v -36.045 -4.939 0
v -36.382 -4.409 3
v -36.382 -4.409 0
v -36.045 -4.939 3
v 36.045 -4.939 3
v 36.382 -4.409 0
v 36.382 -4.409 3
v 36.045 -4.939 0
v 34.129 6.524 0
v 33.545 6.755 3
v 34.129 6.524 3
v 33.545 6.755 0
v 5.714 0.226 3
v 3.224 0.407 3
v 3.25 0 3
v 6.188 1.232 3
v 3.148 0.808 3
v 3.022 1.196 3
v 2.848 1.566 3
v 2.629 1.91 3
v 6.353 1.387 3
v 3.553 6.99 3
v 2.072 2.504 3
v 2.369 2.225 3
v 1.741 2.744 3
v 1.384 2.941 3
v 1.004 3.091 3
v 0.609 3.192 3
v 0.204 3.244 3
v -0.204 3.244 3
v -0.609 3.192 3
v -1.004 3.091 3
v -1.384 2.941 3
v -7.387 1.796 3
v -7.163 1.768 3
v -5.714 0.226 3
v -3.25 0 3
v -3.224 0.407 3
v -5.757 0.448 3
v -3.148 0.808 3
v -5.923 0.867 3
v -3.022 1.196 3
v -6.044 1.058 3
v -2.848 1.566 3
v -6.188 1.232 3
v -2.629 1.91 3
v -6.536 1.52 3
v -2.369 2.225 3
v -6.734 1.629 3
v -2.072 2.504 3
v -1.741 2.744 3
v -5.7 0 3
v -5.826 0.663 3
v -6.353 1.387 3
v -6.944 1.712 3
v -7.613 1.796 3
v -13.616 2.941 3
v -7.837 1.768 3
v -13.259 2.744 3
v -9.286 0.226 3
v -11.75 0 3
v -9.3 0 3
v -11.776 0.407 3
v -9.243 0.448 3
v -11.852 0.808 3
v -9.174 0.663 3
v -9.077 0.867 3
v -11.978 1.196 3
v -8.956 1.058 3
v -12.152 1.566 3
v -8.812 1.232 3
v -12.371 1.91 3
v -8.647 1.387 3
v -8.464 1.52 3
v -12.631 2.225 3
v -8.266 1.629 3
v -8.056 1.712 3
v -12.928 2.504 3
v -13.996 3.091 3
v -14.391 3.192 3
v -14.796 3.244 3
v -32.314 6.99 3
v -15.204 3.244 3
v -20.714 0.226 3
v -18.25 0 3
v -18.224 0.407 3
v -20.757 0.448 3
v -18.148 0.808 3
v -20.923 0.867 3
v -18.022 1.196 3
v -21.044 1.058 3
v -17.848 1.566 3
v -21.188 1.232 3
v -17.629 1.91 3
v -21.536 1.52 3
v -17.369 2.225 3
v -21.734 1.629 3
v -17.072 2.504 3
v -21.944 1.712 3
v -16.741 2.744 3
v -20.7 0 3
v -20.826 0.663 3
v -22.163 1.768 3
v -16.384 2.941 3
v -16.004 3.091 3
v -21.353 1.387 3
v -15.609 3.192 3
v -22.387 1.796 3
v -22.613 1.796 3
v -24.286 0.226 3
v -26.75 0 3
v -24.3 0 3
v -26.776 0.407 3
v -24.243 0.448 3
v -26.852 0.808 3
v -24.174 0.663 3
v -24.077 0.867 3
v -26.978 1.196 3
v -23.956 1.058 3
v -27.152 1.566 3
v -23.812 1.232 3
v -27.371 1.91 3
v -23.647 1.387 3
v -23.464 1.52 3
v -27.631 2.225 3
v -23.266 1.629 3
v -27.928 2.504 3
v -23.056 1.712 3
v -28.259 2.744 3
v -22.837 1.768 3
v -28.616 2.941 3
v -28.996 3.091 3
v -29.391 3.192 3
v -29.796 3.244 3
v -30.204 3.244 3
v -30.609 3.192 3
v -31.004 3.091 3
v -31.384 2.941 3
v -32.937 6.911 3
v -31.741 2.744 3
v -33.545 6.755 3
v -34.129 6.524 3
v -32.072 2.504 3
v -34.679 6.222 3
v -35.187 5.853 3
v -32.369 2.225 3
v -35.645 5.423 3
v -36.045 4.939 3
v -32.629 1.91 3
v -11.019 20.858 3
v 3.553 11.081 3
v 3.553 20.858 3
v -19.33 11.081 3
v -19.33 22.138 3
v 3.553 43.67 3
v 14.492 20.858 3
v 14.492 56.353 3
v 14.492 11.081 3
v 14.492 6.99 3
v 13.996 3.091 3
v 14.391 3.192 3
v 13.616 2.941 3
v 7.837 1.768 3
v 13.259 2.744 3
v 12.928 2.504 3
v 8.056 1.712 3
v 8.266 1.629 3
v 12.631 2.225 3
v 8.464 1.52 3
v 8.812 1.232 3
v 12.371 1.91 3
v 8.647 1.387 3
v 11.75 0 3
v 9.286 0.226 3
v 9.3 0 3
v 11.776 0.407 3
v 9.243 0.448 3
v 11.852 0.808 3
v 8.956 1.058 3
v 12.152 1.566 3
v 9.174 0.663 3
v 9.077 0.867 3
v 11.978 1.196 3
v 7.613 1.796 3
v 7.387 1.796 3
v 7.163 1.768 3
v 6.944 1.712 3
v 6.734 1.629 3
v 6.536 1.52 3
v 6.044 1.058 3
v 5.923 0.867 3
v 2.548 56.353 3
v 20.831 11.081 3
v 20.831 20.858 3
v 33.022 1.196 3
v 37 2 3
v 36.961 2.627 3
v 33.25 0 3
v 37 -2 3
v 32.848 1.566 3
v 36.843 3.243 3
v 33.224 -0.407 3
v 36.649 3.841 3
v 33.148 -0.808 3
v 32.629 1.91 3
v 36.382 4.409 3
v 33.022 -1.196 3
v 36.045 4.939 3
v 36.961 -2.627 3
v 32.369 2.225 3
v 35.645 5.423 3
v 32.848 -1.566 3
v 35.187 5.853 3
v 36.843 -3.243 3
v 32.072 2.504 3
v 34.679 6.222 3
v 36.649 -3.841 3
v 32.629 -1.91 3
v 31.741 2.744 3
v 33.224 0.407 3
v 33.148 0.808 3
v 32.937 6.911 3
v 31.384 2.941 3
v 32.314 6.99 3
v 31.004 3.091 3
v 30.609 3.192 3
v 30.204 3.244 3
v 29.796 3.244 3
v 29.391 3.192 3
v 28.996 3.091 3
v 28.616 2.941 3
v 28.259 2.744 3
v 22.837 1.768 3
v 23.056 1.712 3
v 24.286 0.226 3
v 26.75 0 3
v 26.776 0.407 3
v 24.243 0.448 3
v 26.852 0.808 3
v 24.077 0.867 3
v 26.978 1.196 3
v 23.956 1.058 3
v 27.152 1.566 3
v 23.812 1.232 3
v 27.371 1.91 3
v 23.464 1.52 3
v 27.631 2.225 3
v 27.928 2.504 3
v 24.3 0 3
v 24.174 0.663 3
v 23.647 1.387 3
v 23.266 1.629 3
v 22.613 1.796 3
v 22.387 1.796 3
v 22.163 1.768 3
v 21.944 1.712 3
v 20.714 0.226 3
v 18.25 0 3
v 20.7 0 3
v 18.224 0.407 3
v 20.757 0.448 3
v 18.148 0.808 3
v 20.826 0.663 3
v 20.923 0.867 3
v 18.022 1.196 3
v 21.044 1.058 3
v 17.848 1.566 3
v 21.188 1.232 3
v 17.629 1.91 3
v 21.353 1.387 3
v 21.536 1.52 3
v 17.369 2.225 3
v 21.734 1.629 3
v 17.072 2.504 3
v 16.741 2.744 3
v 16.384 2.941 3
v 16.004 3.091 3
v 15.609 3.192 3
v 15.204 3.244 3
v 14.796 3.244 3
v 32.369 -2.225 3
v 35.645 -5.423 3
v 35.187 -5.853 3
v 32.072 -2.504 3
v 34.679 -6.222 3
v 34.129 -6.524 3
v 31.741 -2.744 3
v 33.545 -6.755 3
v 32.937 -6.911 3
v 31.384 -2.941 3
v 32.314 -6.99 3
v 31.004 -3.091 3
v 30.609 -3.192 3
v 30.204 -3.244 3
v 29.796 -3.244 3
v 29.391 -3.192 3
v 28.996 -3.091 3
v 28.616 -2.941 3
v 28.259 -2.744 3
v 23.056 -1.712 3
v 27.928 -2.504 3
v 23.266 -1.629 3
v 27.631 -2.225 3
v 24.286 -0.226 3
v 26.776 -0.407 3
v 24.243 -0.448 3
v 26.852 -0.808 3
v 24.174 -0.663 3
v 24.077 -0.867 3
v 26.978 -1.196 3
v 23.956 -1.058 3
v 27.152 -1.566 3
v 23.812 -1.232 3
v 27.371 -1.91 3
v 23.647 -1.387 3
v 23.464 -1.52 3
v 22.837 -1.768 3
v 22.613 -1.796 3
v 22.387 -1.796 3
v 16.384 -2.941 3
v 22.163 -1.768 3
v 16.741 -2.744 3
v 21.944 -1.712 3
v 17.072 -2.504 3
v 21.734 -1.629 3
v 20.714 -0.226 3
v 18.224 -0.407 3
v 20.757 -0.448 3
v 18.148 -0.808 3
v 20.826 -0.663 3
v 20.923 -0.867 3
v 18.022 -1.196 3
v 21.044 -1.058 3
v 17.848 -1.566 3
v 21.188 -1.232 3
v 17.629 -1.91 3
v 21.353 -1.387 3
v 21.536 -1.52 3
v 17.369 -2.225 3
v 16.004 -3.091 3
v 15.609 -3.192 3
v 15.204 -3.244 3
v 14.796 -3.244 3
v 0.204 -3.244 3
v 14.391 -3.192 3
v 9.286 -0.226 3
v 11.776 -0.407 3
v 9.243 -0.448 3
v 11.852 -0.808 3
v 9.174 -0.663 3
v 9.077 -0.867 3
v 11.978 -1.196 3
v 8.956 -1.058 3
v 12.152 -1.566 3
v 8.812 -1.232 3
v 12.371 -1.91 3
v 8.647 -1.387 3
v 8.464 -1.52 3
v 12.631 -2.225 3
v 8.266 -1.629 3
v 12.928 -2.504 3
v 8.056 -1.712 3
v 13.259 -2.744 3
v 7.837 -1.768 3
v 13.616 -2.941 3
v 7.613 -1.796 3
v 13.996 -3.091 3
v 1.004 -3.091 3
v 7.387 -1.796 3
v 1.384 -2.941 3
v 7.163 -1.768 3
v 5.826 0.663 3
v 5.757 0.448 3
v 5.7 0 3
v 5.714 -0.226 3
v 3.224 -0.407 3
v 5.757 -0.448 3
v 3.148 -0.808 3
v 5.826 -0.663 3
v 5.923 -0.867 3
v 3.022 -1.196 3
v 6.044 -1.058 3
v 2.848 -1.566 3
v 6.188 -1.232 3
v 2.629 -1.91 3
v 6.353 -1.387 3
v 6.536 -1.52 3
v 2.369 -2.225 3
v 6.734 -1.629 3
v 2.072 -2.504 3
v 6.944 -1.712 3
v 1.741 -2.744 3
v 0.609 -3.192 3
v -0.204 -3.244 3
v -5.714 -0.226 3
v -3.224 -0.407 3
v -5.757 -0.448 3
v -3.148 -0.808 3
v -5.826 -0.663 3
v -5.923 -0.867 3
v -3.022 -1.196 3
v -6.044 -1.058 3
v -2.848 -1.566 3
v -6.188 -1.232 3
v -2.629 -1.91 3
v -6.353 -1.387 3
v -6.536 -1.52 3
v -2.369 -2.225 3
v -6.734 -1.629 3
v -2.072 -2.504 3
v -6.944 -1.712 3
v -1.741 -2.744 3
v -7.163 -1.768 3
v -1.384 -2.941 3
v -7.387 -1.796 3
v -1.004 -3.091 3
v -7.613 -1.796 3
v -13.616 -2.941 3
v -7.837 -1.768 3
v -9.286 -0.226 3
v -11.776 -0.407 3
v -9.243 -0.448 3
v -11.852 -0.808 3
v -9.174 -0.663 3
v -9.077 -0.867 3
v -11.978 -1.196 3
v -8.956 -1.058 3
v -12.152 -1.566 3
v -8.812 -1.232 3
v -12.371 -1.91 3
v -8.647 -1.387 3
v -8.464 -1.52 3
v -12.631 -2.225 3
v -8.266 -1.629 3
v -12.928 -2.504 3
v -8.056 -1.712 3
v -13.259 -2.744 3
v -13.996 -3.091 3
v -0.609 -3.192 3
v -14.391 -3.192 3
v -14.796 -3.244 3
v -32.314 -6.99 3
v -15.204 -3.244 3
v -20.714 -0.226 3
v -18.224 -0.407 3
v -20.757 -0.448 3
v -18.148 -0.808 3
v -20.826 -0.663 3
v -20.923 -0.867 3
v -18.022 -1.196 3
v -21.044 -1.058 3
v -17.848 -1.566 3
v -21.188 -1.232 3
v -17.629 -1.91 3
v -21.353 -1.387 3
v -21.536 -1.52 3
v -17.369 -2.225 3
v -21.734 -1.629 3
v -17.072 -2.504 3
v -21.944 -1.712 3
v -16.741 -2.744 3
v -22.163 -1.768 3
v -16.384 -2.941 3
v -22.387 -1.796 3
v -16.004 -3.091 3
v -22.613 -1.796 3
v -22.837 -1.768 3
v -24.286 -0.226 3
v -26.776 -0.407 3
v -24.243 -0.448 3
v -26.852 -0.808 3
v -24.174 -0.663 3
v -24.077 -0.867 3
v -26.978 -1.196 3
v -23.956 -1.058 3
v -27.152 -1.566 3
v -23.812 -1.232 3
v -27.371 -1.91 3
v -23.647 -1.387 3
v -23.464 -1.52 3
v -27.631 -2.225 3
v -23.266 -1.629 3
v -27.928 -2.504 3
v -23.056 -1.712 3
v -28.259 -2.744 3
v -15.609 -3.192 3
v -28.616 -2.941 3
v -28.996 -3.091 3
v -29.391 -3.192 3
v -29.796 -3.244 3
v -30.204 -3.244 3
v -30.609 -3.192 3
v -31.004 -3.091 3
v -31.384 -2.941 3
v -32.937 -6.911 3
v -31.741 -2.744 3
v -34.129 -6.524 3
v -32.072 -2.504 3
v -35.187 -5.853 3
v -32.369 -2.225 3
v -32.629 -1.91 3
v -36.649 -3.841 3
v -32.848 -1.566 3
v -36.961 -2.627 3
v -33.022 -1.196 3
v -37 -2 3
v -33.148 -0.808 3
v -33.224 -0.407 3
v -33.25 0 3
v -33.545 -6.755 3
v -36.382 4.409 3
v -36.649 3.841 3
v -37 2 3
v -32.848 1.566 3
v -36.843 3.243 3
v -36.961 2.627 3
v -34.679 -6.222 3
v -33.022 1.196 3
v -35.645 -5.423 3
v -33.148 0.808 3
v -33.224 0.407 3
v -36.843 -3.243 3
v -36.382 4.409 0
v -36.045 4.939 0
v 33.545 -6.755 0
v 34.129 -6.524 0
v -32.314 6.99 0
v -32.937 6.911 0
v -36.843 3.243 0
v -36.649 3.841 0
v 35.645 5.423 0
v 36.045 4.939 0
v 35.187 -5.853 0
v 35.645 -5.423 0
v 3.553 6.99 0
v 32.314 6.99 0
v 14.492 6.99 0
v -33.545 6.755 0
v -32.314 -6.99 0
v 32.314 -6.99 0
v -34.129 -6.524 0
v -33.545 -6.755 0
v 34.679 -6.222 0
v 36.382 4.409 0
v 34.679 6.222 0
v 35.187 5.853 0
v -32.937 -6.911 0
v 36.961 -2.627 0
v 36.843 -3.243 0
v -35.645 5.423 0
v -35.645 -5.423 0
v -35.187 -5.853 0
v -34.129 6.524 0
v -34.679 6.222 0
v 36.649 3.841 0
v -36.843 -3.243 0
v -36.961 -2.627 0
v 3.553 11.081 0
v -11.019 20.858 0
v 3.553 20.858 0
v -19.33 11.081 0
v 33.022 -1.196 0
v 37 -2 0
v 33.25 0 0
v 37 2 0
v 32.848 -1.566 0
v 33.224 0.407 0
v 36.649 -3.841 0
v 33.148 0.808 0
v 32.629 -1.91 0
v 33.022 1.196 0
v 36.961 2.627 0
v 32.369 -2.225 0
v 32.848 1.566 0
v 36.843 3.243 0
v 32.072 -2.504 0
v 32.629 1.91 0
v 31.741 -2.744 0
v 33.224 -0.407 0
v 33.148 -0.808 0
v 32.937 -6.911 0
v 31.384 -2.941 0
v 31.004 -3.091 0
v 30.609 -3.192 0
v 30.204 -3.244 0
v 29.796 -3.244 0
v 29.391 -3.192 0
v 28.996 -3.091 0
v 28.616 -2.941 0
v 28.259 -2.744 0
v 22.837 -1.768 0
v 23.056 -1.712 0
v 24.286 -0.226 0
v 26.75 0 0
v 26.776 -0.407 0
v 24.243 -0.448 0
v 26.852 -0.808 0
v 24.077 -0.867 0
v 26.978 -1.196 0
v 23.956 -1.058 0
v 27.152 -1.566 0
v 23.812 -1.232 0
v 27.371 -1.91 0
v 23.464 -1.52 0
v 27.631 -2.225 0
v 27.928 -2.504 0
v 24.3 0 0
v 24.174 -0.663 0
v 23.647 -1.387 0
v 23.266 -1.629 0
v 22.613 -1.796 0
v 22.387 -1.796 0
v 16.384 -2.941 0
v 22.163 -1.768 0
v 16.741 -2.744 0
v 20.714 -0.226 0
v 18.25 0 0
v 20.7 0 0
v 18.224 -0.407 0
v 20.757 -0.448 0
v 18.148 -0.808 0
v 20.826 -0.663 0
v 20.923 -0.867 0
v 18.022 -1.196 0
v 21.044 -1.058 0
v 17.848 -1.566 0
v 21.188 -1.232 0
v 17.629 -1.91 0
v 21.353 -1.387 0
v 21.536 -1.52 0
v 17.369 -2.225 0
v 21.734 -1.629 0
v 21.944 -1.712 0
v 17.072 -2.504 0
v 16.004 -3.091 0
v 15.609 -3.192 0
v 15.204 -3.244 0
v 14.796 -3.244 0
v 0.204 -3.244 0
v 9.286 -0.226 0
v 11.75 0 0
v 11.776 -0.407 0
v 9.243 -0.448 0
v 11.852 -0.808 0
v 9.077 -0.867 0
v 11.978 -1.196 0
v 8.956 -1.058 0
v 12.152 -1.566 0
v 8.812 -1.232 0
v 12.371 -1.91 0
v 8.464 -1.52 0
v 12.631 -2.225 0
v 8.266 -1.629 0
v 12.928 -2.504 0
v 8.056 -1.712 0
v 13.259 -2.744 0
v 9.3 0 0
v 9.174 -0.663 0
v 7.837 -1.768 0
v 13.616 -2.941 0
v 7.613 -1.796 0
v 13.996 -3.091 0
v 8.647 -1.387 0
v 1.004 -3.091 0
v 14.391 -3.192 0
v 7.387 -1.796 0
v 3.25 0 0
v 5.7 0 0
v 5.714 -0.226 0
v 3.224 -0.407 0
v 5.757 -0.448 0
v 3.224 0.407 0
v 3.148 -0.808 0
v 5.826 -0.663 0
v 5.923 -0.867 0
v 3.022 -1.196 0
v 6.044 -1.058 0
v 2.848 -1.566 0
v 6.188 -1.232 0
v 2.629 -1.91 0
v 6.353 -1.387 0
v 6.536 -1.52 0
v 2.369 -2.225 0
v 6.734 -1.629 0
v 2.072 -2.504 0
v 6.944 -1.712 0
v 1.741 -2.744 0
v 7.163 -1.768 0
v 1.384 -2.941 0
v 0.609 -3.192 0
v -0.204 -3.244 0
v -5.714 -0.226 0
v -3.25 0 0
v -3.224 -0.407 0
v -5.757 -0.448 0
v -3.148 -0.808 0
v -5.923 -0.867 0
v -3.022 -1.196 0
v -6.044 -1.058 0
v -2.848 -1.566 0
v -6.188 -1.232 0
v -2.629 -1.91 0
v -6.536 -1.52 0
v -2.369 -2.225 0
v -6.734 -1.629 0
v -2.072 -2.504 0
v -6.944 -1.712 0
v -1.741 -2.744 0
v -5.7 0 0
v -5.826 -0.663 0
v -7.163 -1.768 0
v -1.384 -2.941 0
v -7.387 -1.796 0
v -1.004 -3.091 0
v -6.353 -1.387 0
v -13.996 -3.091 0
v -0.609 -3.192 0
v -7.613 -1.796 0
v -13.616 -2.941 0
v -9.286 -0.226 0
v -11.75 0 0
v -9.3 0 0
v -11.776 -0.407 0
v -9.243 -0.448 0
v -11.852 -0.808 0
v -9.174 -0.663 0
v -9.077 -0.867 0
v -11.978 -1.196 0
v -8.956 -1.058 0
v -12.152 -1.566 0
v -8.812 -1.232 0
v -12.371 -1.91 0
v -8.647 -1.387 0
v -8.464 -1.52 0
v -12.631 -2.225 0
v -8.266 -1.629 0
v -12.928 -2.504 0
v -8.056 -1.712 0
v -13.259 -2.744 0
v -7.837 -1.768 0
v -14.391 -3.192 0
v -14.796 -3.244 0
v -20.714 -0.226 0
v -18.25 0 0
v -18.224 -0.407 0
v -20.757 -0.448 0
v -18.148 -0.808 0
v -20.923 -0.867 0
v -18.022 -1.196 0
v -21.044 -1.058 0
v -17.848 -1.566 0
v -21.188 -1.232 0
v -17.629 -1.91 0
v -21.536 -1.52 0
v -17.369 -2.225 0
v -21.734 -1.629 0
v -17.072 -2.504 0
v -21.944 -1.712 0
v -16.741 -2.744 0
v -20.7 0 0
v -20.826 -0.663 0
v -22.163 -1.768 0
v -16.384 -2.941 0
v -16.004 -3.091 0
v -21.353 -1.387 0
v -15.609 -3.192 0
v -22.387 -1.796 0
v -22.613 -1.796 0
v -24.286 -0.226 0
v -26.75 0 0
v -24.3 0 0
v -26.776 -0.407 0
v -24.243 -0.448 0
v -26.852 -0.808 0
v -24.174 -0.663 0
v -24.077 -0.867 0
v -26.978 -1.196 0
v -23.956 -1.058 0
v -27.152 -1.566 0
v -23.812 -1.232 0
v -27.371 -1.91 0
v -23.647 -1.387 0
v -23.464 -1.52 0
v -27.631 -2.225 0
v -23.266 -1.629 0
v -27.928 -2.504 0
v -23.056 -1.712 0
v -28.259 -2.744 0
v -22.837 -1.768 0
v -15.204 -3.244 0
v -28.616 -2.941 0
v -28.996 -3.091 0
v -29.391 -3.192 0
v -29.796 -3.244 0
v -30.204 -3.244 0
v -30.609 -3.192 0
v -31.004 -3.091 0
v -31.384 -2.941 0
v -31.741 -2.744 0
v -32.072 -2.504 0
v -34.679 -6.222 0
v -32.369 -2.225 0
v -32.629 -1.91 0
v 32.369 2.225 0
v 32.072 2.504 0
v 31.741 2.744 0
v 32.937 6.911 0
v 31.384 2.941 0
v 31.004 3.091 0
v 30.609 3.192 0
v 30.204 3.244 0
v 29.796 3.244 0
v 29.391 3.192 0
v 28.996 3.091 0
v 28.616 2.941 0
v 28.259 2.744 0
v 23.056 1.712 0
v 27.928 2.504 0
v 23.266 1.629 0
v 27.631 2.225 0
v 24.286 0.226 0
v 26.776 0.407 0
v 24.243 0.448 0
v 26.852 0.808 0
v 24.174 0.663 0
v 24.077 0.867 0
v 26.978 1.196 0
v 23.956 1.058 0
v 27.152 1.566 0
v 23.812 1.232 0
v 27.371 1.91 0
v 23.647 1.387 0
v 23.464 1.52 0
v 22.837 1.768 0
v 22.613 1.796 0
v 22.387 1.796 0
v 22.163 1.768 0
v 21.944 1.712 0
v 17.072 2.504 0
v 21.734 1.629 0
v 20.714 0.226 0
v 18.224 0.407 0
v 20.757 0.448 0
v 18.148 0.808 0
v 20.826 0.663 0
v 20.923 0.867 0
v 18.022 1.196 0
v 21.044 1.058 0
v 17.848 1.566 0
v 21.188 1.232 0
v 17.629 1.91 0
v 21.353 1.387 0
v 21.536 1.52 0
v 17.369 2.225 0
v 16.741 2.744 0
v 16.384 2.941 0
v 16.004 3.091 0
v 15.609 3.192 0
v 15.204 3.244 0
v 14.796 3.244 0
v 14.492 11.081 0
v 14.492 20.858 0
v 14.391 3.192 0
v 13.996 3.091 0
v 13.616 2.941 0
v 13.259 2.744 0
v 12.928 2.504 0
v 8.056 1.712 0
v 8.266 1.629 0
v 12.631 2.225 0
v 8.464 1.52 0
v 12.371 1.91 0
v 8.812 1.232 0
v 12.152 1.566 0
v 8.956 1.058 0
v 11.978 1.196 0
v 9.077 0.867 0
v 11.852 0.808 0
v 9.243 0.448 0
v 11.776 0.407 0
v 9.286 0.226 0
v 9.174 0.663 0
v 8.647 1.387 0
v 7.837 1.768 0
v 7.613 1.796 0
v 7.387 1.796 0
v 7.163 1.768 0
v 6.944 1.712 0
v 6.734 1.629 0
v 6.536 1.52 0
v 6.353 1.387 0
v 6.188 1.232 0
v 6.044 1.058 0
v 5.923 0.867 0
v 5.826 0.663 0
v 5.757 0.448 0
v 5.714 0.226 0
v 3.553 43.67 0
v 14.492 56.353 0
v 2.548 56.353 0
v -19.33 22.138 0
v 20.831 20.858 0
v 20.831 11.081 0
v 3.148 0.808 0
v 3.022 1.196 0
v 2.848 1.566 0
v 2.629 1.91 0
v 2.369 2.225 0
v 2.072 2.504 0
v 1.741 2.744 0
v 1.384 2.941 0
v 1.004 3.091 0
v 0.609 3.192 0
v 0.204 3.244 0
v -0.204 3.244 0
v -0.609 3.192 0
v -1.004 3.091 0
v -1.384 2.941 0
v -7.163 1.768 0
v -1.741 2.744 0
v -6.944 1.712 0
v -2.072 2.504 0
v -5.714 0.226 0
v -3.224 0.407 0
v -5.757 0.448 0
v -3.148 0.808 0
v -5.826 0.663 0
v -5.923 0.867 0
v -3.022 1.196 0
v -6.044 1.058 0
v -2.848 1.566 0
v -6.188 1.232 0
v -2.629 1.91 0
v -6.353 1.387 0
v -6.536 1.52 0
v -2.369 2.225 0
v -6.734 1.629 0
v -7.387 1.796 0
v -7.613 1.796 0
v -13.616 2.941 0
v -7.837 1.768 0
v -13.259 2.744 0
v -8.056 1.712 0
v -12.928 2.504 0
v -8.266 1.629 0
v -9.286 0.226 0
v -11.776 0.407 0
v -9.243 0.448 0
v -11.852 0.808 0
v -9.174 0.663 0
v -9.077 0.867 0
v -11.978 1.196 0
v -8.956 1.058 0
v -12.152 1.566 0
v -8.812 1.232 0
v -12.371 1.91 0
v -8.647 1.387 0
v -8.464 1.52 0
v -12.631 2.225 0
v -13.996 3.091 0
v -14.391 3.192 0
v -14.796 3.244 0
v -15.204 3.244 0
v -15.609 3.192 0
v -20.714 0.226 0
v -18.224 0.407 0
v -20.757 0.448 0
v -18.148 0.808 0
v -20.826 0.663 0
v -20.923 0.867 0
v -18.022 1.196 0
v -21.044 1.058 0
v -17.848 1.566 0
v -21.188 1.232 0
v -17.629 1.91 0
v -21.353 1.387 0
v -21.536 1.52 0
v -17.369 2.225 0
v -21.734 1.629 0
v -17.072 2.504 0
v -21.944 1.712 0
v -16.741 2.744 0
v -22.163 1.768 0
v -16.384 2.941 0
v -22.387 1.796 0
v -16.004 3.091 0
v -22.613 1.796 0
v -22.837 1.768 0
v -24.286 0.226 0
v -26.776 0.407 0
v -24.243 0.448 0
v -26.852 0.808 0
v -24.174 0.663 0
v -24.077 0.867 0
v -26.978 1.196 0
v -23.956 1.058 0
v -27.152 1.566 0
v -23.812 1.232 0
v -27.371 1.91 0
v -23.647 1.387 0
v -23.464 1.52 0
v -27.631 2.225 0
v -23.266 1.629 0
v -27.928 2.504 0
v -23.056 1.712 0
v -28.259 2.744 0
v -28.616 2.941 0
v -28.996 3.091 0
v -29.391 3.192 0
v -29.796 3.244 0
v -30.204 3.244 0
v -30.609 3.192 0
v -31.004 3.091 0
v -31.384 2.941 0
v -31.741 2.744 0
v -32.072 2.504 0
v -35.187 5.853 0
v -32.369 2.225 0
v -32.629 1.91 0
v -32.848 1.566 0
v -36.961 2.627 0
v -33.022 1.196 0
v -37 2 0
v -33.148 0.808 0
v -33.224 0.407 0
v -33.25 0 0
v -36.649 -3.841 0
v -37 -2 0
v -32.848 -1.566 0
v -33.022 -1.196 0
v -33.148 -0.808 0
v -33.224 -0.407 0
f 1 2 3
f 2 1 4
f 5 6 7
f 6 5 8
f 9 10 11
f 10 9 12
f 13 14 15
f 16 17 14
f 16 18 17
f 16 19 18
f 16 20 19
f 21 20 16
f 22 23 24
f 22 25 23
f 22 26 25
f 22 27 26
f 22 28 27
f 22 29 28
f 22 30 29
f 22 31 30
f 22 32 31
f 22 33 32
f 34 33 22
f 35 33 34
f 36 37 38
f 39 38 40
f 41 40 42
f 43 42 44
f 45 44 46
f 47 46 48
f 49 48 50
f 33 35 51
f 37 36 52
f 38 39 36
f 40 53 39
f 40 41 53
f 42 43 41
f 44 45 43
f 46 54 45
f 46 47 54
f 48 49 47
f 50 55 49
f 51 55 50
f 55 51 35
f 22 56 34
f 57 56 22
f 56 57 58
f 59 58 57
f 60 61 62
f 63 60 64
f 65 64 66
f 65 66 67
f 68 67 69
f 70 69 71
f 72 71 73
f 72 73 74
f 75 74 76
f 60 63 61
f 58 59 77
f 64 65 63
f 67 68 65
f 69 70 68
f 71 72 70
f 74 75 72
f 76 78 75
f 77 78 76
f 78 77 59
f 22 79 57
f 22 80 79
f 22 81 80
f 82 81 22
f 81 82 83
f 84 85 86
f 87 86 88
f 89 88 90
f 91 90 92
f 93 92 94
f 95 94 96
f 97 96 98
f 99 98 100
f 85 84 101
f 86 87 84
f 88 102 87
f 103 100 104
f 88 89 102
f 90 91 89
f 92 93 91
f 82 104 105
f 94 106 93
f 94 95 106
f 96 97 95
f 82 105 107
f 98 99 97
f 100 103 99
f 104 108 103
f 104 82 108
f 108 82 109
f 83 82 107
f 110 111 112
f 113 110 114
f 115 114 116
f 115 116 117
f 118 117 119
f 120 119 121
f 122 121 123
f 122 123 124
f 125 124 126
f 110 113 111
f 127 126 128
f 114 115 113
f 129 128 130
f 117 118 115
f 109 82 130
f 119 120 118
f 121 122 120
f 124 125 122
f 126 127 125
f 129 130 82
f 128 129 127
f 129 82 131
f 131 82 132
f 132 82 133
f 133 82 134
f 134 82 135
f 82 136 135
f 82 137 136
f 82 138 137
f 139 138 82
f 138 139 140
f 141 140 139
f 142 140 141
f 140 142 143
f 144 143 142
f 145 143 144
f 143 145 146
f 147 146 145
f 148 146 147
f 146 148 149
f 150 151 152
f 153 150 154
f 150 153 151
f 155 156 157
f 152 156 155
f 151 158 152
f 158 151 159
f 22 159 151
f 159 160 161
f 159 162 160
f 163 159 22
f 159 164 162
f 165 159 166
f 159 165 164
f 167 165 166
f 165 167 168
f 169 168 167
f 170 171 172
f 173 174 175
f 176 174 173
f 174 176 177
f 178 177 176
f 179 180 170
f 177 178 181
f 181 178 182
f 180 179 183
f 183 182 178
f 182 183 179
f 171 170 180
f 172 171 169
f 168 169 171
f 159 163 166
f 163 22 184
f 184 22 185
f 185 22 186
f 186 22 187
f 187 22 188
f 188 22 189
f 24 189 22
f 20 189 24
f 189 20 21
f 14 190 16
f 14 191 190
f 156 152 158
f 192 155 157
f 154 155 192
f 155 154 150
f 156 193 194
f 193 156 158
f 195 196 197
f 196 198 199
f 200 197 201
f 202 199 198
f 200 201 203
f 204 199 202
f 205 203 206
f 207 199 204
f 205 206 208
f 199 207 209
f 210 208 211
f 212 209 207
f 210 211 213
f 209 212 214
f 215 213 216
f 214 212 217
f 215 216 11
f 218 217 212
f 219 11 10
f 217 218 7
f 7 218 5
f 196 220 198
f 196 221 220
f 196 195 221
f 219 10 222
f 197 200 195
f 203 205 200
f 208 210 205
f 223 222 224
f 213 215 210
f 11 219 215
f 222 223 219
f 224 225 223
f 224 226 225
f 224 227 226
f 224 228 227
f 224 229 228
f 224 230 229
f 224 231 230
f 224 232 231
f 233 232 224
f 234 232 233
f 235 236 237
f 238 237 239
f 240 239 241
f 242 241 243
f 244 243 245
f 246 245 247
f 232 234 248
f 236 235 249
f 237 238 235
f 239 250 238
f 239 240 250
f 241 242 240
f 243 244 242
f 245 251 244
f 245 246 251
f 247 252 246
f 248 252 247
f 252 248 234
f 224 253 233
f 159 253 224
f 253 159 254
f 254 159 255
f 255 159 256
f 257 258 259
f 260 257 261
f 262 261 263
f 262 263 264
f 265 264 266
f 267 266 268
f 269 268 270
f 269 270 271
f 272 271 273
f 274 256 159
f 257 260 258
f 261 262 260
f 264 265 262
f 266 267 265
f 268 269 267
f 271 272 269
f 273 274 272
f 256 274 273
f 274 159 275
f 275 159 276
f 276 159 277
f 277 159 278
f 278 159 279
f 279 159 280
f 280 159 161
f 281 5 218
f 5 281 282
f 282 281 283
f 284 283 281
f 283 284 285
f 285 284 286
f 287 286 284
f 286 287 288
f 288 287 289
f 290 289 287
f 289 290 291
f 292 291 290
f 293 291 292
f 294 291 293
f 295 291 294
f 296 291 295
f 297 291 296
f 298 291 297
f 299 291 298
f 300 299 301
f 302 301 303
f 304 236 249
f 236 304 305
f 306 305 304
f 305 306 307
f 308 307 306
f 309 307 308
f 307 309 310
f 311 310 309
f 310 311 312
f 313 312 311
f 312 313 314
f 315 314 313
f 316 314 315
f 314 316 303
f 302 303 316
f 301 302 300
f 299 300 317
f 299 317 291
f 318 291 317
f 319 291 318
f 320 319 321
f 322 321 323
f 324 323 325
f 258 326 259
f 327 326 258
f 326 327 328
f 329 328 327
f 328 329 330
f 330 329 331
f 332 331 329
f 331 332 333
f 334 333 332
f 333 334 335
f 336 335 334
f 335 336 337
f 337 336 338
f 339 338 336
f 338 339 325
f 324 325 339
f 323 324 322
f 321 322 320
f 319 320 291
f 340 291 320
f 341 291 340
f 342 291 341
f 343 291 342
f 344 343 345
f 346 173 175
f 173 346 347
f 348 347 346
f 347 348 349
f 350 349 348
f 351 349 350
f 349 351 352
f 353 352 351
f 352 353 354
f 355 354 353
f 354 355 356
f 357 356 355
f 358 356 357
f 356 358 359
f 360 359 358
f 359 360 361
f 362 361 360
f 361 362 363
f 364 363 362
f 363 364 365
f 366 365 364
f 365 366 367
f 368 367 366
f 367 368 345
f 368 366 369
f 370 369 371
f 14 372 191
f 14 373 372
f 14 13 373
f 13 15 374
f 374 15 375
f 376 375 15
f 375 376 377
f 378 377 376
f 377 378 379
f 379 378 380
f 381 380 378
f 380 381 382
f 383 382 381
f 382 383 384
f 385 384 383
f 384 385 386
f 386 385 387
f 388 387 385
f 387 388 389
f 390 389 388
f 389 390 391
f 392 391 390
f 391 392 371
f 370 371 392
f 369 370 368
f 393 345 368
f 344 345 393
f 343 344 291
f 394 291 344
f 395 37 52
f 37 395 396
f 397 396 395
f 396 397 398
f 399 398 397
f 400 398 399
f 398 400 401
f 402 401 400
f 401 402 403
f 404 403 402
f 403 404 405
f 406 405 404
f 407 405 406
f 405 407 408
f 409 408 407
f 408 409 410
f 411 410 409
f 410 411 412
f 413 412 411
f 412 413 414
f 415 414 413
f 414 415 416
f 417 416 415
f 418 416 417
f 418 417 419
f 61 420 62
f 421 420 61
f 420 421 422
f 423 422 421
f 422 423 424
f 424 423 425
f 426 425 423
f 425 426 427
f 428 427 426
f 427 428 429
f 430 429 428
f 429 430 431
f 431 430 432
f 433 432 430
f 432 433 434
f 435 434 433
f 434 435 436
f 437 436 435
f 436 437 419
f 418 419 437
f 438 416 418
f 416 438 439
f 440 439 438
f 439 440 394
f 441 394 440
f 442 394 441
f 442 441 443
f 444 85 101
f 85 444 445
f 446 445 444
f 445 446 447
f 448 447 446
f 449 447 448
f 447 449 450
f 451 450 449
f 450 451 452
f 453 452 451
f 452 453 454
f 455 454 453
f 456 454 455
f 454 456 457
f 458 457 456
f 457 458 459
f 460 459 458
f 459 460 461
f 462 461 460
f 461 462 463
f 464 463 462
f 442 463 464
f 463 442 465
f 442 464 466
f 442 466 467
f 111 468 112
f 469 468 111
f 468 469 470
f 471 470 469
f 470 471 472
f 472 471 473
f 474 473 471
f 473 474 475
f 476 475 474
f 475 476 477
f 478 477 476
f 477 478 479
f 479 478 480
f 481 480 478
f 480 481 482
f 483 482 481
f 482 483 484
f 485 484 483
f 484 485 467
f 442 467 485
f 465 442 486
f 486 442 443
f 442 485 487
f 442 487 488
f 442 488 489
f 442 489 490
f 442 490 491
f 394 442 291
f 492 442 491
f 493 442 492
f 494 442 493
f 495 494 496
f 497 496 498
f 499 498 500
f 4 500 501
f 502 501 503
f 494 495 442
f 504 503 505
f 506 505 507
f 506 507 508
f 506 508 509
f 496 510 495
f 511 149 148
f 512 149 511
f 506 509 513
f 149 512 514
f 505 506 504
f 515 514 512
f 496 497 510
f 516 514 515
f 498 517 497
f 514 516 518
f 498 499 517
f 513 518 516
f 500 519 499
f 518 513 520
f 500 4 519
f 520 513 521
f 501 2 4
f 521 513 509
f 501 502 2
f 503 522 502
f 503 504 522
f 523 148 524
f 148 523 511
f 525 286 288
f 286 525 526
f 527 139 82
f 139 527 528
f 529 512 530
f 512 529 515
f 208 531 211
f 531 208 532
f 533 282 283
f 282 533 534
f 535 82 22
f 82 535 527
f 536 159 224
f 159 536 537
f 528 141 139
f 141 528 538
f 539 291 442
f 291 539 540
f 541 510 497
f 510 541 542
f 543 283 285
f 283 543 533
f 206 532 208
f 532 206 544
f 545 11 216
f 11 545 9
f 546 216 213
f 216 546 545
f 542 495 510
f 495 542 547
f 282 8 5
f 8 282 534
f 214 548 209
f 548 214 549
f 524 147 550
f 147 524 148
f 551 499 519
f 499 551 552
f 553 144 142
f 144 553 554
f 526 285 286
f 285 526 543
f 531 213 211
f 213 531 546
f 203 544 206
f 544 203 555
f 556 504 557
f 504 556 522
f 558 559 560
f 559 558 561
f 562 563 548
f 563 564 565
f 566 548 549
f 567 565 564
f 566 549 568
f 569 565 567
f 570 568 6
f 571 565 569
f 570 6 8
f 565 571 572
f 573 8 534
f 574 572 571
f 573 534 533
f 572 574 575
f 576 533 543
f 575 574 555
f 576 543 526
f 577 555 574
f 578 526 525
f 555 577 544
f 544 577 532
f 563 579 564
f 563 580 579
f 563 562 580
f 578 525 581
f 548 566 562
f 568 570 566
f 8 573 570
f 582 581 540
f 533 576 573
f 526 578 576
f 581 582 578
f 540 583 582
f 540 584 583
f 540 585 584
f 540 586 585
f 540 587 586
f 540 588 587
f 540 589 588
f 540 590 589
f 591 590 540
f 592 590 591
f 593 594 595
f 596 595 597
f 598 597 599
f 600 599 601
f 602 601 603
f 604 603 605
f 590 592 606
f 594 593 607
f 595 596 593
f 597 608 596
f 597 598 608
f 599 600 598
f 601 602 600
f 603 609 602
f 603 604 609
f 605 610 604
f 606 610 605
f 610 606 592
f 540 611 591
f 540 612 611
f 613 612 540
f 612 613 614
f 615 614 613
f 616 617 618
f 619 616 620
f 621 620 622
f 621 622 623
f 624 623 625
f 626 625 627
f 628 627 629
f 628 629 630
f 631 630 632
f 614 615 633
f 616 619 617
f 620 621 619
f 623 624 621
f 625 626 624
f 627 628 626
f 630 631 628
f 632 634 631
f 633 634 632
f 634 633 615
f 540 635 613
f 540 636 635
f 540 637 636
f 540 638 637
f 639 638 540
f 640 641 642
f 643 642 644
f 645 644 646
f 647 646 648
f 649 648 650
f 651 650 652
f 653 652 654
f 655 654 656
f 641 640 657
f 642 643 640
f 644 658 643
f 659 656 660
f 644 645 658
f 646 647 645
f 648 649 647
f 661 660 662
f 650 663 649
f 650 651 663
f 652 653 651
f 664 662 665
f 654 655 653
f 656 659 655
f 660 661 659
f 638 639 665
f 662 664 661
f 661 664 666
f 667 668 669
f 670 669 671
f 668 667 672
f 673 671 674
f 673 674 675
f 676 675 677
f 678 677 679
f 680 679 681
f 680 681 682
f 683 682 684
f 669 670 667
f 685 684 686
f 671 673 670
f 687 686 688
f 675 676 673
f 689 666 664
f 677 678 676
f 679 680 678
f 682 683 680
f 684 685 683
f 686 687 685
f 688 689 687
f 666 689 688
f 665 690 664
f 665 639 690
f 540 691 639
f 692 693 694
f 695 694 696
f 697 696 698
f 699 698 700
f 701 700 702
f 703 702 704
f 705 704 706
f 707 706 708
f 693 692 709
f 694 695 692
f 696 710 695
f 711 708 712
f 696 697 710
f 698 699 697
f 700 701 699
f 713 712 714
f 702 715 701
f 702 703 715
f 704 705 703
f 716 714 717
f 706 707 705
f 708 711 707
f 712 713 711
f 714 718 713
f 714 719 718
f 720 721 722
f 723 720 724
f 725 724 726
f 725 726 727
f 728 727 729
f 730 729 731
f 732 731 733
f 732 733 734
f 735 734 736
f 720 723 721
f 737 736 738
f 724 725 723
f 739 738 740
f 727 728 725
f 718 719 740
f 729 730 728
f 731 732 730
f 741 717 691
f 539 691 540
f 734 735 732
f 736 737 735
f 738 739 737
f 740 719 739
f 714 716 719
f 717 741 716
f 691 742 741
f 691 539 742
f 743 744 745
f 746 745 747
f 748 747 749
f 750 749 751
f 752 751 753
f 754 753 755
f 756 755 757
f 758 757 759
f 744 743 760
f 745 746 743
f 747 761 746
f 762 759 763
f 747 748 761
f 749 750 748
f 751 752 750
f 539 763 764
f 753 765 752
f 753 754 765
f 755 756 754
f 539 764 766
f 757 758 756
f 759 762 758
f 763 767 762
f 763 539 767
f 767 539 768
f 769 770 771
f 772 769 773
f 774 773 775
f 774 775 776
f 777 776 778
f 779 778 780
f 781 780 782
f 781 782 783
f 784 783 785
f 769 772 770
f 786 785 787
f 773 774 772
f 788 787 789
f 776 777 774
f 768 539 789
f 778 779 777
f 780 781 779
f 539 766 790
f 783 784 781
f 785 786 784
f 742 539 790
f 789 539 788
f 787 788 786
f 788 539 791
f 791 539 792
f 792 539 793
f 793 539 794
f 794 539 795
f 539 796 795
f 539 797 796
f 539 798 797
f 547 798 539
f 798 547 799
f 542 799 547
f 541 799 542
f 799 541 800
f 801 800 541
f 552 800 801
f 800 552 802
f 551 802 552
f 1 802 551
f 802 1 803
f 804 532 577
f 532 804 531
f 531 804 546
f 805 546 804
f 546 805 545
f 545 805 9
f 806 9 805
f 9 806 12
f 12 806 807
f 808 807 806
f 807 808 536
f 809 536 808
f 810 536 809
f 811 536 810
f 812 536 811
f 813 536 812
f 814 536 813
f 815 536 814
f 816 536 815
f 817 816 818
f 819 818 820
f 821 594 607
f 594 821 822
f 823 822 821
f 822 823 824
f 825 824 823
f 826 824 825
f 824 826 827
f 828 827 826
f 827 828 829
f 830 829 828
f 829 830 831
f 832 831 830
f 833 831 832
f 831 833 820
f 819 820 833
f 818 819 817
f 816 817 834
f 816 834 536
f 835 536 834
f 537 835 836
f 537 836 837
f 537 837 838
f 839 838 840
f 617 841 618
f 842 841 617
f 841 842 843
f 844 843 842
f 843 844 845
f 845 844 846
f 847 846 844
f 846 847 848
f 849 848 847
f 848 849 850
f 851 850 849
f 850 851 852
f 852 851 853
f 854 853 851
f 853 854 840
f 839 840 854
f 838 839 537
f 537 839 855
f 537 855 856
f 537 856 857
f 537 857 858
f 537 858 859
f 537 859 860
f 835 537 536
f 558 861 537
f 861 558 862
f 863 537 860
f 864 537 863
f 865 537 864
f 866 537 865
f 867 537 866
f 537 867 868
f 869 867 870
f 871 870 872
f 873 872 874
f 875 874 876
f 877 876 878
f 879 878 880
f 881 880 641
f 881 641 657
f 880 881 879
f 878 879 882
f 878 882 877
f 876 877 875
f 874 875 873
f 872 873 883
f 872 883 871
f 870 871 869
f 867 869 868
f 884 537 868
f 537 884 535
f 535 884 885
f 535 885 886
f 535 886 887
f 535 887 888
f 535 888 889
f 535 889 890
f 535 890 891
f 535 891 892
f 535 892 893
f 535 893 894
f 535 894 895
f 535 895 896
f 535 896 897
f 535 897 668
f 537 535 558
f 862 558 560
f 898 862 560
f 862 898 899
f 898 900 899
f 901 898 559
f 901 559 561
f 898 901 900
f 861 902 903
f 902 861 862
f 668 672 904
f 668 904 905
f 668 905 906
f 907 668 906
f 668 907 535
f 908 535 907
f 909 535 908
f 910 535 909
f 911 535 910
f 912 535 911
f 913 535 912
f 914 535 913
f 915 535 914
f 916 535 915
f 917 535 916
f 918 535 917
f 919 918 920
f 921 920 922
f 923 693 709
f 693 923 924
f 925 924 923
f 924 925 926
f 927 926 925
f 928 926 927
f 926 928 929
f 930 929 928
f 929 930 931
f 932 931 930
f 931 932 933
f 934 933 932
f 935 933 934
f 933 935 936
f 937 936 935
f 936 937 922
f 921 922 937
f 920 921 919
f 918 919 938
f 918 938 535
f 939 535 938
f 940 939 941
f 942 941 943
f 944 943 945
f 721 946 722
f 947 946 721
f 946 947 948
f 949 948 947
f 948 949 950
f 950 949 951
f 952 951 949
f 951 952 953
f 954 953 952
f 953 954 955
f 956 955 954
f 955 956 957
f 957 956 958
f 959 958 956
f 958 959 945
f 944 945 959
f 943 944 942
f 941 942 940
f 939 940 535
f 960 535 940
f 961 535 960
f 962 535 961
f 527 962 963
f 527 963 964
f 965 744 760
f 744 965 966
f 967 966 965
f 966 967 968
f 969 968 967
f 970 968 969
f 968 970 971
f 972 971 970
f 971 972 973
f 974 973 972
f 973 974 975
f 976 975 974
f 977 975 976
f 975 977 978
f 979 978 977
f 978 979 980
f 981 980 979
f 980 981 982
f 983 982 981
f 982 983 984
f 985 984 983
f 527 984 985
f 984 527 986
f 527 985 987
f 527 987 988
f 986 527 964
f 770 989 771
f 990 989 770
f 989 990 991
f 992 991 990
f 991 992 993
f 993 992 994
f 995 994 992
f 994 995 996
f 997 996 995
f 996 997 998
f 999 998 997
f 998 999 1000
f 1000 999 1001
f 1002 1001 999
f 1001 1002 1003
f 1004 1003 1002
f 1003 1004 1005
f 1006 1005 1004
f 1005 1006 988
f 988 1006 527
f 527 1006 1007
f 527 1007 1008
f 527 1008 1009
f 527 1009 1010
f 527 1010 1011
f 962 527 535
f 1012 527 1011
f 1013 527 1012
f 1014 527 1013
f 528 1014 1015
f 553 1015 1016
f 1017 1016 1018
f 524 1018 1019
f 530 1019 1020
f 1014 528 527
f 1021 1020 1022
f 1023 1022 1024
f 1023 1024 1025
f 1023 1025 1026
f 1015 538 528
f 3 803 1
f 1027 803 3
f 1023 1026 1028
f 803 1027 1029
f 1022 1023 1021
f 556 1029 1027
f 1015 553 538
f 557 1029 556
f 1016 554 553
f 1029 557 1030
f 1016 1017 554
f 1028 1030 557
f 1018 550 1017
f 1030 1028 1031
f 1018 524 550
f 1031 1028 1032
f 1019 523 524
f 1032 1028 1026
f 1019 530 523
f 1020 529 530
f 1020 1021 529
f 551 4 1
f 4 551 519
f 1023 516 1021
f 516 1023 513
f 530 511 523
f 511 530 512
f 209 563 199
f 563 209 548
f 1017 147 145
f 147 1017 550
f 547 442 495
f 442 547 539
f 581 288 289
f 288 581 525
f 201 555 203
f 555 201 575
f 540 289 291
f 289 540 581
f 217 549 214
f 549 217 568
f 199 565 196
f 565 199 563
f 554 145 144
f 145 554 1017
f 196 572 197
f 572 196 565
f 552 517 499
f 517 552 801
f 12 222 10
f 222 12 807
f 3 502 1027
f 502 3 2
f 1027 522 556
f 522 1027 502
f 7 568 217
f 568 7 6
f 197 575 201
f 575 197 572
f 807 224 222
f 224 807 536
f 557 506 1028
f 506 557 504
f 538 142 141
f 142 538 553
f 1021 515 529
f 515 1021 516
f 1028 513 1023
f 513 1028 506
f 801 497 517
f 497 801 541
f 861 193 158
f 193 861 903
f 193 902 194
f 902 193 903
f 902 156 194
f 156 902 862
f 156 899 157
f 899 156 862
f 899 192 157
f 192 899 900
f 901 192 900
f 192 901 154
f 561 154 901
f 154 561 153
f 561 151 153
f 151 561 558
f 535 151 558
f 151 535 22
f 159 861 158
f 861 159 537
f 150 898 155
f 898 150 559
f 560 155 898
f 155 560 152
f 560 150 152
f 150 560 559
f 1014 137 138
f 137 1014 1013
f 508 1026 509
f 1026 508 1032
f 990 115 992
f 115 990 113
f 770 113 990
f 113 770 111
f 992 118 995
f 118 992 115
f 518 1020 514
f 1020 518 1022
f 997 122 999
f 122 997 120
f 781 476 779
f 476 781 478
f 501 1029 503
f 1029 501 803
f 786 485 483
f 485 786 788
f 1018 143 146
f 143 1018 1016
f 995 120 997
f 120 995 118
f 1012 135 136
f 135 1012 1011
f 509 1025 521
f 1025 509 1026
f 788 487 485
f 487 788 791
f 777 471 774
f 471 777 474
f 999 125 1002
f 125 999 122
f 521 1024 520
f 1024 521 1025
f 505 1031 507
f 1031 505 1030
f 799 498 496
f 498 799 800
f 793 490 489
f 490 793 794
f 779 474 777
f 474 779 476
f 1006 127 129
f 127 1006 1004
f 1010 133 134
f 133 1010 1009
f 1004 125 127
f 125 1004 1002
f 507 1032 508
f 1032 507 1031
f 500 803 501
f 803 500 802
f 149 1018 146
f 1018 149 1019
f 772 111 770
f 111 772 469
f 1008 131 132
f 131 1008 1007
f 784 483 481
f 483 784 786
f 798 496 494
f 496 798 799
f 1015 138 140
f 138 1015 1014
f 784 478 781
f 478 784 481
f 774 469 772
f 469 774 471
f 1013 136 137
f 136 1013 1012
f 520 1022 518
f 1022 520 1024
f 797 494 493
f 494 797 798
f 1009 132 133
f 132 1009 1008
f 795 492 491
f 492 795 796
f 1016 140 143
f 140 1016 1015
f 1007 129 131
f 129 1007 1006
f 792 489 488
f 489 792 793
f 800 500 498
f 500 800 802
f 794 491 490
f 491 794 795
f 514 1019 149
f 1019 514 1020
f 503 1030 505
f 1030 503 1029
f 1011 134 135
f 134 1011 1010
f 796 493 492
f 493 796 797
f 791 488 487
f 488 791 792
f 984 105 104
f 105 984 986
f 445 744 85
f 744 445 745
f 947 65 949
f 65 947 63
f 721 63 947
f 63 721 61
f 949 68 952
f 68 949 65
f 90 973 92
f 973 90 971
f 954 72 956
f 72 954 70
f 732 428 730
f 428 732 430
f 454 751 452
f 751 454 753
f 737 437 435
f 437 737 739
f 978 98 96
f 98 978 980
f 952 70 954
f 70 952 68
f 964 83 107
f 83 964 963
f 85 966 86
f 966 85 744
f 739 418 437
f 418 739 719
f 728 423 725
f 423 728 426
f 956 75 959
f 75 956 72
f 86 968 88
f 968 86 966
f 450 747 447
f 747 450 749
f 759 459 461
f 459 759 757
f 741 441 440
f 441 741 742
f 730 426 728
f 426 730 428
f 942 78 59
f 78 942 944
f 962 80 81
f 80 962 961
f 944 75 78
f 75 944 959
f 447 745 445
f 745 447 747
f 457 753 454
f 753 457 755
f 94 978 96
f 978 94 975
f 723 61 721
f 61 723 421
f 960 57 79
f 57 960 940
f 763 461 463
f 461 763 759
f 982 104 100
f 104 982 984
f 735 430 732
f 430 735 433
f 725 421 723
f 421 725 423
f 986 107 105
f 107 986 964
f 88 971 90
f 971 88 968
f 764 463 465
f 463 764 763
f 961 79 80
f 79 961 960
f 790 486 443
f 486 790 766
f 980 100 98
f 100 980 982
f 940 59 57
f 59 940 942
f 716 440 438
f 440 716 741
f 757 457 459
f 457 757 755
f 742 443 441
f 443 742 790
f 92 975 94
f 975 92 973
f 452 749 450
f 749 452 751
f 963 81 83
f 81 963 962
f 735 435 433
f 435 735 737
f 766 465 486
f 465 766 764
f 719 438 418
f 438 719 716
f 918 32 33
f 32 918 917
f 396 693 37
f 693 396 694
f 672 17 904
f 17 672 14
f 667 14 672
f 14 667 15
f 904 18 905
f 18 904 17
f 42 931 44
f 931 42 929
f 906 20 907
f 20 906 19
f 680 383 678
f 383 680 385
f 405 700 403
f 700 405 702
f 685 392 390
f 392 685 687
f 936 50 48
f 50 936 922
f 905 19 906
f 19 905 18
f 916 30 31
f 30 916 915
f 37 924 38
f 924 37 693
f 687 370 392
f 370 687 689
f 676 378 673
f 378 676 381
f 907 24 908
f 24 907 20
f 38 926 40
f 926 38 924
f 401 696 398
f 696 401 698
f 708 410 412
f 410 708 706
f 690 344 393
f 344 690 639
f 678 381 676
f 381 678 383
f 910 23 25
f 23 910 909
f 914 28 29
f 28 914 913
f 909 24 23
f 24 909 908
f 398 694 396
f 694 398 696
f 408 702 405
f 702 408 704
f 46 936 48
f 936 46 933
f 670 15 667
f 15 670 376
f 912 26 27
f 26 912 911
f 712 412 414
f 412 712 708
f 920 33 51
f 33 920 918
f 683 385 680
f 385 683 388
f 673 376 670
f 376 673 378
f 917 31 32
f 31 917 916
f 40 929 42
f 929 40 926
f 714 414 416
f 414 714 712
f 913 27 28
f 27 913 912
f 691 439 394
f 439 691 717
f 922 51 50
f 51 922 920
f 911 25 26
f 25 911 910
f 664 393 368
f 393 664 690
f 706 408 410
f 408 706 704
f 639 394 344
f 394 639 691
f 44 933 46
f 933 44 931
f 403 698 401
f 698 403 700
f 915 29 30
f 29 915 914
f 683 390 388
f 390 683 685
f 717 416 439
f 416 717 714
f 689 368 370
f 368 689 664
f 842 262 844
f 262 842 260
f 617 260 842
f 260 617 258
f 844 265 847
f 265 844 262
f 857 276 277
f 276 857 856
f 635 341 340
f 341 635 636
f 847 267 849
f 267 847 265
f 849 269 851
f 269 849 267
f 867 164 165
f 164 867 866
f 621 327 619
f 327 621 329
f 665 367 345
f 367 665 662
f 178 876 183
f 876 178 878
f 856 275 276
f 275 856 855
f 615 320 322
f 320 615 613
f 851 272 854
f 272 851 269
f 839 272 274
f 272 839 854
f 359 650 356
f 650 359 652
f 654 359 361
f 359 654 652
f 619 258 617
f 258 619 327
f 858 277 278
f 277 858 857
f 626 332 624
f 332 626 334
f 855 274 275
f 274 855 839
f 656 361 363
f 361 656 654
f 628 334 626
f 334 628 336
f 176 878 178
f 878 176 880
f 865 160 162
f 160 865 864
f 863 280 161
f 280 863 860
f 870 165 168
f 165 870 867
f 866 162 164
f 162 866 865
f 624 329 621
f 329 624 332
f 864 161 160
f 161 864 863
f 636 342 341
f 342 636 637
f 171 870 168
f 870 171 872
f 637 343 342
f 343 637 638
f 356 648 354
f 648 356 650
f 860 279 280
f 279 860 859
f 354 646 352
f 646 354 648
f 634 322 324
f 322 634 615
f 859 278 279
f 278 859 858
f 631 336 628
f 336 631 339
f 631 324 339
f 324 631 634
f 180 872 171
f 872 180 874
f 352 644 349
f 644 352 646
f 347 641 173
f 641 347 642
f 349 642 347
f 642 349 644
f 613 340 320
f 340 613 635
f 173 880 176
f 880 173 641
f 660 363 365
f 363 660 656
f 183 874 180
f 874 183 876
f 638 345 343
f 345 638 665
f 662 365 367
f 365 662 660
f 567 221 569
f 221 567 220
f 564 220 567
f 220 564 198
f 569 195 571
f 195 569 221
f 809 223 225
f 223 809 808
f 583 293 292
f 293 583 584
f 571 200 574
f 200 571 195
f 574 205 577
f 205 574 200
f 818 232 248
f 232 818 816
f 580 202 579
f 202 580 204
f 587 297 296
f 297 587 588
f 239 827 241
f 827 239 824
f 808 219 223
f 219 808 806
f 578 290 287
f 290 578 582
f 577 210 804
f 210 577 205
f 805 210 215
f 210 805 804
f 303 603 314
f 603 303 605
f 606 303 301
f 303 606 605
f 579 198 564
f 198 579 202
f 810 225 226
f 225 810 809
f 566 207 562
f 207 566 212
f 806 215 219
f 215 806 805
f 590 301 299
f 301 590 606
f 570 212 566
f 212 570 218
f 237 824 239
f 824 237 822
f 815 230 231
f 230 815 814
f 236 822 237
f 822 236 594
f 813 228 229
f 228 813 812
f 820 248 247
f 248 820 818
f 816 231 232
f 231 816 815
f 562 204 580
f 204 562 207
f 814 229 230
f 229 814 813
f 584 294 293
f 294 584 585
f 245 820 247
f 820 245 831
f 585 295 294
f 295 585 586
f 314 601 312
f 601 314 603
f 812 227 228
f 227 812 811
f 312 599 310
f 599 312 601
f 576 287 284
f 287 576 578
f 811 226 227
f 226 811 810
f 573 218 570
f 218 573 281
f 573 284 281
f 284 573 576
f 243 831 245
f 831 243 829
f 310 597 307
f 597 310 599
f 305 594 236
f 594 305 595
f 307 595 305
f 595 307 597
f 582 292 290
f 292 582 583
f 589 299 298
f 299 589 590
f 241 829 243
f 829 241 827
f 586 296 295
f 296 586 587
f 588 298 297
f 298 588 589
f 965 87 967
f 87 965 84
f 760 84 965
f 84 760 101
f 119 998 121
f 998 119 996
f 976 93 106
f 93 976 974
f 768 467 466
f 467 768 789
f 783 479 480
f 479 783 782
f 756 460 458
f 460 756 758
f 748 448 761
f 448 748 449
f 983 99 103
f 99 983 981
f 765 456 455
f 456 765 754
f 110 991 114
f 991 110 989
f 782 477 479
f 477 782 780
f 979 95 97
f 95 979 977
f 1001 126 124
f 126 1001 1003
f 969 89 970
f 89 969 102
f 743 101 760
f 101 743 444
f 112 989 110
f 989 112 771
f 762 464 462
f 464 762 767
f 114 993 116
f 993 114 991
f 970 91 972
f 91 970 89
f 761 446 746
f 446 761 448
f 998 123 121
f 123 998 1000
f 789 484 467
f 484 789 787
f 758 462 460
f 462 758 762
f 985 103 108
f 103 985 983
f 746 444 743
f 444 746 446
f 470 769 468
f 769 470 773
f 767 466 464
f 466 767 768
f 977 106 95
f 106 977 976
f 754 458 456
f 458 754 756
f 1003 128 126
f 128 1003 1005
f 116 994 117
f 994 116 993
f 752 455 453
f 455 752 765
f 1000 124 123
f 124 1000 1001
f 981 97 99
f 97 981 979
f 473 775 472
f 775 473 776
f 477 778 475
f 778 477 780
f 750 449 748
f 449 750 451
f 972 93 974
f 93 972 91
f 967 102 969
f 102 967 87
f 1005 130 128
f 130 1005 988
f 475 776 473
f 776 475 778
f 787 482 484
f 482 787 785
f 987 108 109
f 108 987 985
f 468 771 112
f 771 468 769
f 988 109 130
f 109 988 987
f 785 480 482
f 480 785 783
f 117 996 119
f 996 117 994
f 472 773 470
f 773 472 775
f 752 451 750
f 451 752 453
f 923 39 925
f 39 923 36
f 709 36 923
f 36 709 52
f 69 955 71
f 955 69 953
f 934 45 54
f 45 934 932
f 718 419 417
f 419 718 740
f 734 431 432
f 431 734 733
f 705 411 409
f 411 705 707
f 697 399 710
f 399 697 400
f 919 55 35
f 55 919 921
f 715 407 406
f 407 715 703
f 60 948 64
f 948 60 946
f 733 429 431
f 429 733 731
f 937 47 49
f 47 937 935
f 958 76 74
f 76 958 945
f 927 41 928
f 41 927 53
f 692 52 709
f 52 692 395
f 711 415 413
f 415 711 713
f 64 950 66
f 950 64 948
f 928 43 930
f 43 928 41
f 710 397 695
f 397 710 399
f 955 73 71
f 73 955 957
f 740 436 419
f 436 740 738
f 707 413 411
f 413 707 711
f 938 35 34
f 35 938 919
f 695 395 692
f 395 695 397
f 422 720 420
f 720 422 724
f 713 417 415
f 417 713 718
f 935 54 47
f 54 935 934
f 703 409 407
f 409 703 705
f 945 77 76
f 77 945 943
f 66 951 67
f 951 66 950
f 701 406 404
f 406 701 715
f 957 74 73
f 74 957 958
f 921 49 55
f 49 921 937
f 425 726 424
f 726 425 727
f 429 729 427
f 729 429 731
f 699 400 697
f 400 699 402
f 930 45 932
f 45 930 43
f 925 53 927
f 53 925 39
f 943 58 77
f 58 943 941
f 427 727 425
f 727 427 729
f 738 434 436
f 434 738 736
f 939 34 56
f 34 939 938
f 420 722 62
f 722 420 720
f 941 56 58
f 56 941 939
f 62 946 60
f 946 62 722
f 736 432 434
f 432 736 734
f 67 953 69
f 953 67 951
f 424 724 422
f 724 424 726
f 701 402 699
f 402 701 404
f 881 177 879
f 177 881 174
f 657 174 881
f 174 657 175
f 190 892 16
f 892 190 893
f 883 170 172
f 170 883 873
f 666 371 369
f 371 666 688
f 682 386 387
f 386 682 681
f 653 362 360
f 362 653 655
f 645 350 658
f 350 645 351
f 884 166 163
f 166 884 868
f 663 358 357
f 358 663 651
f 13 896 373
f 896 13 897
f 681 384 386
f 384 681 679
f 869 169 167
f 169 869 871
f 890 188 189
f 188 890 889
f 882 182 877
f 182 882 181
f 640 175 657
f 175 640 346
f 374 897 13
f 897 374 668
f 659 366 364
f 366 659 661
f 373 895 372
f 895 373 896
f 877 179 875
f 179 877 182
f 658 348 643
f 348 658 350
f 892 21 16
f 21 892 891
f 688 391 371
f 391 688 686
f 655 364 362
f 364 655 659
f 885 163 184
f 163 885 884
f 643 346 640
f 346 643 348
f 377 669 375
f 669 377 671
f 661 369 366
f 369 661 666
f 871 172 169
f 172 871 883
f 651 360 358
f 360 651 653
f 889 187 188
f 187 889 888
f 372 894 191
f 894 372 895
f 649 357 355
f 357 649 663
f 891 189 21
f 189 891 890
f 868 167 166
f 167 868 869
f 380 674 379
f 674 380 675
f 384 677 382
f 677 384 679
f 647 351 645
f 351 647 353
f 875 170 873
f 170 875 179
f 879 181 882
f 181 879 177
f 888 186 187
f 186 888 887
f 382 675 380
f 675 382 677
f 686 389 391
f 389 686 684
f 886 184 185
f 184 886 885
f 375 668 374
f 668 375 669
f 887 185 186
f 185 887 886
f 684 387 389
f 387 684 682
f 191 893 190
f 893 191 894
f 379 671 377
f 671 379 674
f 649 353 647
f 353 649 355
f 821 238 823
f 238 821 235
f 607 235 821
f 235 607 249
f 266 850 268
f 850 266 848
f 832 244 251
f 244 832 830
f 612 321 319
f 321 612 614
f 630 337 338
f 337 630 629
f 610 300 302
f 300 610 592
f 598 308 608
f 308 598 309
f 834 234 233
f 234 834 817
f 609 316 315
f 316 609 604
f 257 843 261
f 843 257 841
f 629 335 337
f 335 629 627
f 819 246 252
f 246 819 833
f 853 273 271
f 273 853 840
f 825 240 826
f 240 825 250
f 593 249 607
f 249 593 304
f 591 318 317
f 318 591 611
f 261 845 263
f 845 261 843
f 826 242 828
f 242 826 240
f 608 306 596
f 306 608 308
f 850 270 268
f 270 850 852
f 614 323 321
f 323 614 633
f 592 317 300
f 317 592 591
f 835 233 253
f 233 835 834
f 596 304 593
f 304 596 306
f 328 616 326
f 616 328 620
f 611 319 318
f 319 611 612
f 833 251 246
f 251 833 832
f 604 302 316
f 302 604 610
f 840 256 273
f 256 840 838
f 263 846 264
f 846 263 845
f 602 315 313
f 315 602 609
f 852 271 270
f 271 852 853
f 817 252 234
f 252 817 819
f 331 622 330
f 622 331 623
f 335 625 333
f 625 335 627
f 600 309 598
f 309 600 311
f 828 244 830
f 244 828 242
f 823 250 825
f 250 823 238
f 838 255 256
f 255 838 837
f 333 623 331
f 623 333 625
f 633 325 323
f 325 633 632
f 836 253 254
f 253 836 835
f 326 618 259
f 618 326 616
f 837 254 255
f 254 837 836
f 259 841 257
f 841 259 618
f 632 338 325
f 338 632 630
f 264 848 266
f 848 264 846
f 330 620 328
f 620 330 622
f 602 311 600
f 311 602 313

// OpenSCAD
$fn = 50;


difference() {
	union() {
		hull() {
			translate(v = [-32.0000000000, 2.0000000000, 0]) {
				cylinder(h = 3, r = 5);
			}
			translate(v = [32.0000000000, 2.0000000000, 0]) {
				cylinder(h = 3, r = 5);
			}
			translate(v = [-32.0000000000, -2.0000000000, 0]) {
				cylinder(h = 3, r = 5);
			}
			translate(v = [32.0000000000, -2.0000000000, 0]) {
				cylinder(h = 3, r = 5);
			}
		}
		translate(v = [0, 55, 0]) {
			linear_extrude(height = 3) {
				text(font = "DejaVu Sans Mono:style=Bold", halign = "center", size = 57.0000000000, text = "4", valign = "top");
			}
		}
	}
	union() {
		translate(v = [-30.0000000000, 0.0000000000, 0]) {
			translate(v = [0, 0, -100]) {
				cylinder(h = 200, r = 3.2500000000);
			}
		}
		translate(v = [-15.0000000000, 0.0000000000, 0]) {
			translate(v = [0, 0, -100]) {
				cylinder(h = 200, r = 3.2500000000);
			}
		}
		translate(v = [0, 0, -100]) {
			cylinder(h = 200, r = 3.2500000000);
		}
		translate(v = [15.0000000000, 0.0000000000, 0]) {
			translate(v = [0, 0, -100]) {
				cylinder(h = 200, r = 3.2500000000);
			}
		}
		translate(v = [30.0000000000, 0.0000000000, 0]) {
			translate(v = [0, 0, -100]) {
				cylinder(h = 200, r = 3.2500000000);
			}
		}
		translate(v = [-30.0000000000, 0.0000000000, 0]) {
			translate(v = [0, 0, -100]) {
				cylinder(h = 200, r = 1.8000000000);
			}
		}
		translate(v = [-22.5000000000, 0.0000000000, 0]) {
			translate(v = [0, 0, -100]) {
				cylinder(h = 200, r = 1.8000000000);
			}
		}
		translate(v = [-15.0000000000, 0.0000000000, 0]) {
			translate(v = [0, 0, -100]) {
				cylinder(h = 200, r = 1.8000000000);
			}
		}
		translate(v = [-7.5000000000, 0.0000000000, 0]) {
			translate(v = [0, 0, -100]) {
				cylinder(h = 200, r = 1.8000000000);
			}
		}
		translate(v = [0, 0, -100]) {
			cylinder(h = 200, r = 1.8000000000);
		}
		translate(v = [7.5000000000, 0.0000000000, 0]) {
			translate(v = [0, 0, -100]) {
				cylinder(h = 200, r = 1.8000000000);
			}
		}
		translate(v = [15.0000000000, 0.0000000000, 0]) {
			translate(v = [0, 0, -100]) {
				cylinder(h = 200, r = 1.8000000000);
			}
		}
		translate(v = [22.5000000000, 0.0000000000, 0]) {
			translate(v = [0, 0, -100]) {
				cylinder(h = 200, r = 1.8000000000);
			}
		}
		translate(v = [30.0000000000, 0.0000000000, 0]) {
			translate(v = [0, 0, -100]) {
				cylinder(h = 200, r = 1.8000000000);
			}
		}
	}
}
